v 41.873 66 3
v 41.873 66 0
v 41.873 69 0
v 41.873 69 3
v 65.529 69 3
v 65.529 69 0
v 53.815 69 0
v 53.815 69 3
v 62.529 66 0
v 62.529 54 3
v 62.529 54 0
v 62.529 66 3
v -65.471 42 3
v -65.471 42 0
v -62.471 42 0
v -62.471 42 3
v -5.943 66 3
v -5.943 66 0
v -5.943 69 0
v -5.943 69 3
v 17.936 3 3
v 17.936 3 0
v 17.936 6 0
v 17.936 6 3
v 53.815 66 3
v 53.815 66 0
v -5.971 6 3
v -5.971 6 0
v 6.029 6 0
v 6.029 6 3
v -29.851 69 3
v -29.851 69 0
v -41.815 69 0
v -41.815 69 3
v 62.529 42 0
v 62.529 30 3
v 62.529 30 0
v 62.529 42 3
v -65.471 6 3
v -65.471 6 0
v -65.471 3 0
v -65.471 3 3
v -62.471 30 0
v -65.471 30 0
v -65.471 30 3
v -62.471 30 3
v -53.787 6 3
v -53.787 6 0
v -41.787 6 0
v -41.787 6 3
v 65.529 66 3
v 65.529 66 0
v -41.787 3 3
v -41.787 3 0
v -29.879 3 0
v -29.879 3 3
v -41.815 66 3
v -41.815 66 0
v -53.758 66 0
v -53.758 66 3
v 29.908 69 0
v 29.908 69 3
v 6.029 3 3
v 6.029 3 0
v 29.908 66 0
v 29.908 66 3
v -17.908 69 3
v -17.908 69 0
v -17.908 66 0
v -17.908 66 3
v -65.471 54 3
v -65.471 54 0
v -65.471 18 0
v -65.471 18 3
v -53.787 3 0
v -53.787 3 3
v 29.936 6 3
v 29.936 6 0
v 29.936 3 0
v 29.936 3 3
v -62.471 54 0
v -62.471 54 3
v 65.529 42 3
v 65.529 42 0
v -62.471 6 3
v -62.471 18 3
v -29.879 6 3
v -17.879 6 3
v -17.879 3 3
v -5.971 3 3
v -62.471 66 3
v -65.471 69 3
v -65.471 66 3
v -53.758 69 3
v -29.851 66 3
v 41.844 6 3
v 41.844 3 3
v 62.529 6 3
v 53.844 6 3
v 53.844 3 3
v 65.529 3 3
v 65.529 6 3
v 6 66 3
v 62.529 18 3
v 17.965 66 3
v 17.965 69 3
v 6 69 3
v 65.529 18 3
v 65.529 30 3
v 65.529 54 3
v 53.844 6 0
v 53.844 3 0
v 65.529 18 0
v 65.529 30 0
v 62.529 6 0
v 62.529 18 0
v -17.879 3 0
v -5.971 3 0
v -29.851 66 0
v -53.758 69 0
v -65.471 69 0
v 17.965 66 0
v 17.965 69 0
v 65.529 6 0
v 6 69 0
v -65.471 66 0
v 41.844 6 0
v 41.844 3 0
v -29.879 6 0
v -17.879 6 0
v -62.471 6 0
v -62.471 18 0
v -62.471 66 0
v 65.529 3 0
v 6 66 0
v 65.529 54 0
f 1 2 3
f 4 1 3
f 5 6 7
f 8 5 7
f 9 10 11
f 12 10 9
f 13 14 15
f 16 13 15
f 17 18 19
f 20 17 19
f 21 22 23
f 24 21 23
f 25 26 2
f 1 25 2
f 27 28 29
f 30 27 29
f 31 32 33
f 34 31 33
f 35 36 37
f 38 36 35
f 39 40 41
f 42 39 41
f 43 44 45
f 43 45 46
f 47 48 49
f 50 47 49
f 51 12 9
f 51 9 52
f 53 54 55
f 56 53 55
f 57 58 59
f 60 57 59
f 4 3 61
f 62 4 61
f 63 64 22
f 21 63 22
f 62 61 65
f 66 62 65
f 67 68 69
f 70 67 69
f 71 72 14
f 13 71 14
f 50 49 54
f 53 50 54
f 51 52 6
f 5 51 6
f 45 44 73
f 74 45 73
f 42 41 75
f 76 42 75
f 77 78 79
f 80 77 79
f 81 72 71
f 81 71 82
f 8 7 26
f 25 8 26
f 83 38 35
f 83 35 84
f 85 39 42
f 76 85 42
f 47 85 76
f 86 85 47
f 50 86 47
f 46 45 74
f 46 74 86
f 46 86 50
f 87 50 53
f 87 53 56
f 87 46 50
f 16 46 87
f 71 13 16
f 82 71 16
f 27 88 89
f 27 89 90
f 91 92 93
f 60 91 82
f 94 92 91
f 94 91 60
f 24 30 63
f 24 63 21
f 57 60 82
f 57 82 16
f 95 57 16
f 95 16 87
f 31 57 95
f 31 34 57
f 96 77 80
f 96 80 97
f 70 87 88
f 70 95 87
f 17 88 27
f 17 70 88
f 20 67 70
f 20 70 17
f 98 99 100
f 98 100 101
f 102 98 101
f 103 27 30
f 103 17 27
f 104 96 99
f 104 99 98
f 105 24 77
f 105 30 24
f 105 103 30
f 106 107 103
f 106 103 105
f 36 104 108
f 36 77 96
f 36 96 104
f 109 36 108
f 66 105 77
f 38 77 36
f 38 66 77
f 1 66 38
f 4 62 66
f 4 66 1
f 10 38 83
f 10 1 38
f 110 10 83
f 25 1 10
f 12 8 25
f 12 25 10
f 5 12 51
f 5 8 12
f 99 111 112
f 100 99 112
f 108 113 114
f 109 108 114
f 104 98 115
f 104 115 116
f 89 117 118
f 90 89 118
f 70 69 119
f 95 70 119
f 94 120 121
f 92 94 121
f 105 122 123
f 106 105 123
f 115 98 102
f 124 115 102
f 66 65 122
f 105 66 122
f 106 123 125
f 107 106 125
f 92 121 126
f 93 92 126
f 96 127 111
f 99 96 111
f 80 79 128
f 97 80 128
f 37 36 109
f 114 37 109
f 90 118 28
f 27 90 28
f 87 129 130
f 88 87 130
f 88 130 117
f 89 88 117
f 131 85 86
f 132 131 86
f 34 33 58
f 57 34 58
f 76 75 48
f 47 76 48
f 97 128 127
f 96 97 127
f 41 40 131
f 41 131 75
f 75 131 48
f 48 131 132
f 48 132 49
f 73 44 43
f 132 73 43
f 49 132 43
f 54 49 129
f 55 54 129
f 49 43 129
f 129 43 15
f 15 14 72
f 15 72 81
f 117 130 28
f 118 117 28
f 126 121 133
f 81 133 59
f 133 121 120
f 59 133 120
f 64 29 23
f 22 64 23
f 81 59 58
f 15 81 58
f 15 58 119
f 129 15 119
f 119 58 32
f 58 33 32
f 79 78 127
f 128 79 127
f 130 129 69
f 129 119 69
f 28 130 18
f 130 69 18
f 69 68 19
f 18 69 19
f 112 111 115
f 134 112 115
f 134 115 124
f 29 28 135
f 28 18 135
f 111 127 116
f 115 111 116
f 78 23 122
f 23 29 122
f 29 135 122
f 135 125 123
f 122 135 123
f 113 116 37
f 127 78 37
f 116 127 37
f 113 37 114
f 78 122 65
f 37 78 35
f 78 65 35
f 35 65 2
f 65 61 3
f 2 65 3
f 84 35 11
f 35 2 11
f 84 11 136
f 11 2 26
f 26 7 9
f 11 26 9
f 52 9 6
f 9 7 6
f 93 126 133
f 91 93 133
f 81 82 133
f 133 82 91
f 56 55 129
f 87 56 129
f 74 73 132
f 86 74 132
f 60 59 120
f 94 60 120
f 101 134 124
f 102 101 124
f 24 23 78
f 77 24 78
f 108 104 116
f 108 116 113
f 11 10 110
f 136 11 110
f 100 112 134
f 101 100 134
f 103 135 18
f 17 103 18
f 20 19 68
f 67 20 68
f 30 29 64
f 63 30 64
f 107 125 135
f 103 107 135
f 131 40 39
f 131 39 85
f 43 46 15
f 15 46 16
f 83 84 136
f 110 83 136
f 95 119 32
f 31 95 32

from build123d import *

# Parameters (mm, degrees)
BOSS_EXTRUDE1_DEPTH = 3
SKETCH3_W           = 3
SKETCH3_H           = 12
CUT_EXTRUDE1_DEPTH  = 6


with BuildPart() as part:
    # Sketch2 → Boss-Extrude1 (new body)
    with BuildSketch(Plane.XY):
        Polygon((-65.471428571, 3), (-53.786813187, 3), (-53.786813187, 6), (-41.786813187, 6), (-41.786813187, 3), (-29.879120879, 3), (-29.879120879, 6), (-17.879120879, 6), (-17.879120879, 3), (-5.971428571, 3), (-5.971428571, 6), (6.028571429, 6), (6.028571429, 3), (17.936263736, 3), (17.936263736, 6), (29.936263736, 6), (29.936263736, 3), (41.843956044, 3), (41.843956044, 6), (53.843956044, 6), (53.843956044, 3), (65.528571429, 3), (65.528571429, 69), (53.815384615, 69), (53.815384615, 66), (41.872527473, 66), (41.872527473, 69), (29.907692308, 69), (29.907692308, 66), (17.964835165, 66), (17.964835165, 69), (6, 69), (6, 66), (-5.942857143, 66), (-5.942857143, 69), (-17.907692308, 69), (-17.907692308, 66), (-29.850549451, 66), (-29.850549451, 69), (-41.815384615, 69), (-41.815384615, 66), (-53.758241758, 66), (-53.758241758, 69), (-65.471428571, 69), align=None)
    extrude(amount=BOSS_EXTRUDE1_DEPTH)

    # Sketch3 → Cut-Extrude1 (cut)
    with BuildSketch(Plane.XY.offset(3)):
        with Locations((-63.971428571, 60)):
            Rectangle(SKETCH3_W, SKETCH3_H)
        with Locations((-63.971428571, 12)):
            Rectangle(SKETCH3_W, SKETCH3_H)
        with Locations((64.028571429, 36)):
            Rectangle(SKETCH3_W, SKETCH3_H)
        with Locations((64.028571429, 12)):
            Rectangle(SKETCH3_W, SKETCH3_H)
        with Locations((-63.971428571, 36)):
            Rectangle(SKETCH3_W, SKETCH3_H)
        with Locations((64.028571429, 60)):
            Rectangle(SKETCH3_W, SKETCH3_H)
    extrude(amount=-CUT_EXTRUDE1_DEPTH, mode=Mode.SUBTRACT)


solid = part.part
